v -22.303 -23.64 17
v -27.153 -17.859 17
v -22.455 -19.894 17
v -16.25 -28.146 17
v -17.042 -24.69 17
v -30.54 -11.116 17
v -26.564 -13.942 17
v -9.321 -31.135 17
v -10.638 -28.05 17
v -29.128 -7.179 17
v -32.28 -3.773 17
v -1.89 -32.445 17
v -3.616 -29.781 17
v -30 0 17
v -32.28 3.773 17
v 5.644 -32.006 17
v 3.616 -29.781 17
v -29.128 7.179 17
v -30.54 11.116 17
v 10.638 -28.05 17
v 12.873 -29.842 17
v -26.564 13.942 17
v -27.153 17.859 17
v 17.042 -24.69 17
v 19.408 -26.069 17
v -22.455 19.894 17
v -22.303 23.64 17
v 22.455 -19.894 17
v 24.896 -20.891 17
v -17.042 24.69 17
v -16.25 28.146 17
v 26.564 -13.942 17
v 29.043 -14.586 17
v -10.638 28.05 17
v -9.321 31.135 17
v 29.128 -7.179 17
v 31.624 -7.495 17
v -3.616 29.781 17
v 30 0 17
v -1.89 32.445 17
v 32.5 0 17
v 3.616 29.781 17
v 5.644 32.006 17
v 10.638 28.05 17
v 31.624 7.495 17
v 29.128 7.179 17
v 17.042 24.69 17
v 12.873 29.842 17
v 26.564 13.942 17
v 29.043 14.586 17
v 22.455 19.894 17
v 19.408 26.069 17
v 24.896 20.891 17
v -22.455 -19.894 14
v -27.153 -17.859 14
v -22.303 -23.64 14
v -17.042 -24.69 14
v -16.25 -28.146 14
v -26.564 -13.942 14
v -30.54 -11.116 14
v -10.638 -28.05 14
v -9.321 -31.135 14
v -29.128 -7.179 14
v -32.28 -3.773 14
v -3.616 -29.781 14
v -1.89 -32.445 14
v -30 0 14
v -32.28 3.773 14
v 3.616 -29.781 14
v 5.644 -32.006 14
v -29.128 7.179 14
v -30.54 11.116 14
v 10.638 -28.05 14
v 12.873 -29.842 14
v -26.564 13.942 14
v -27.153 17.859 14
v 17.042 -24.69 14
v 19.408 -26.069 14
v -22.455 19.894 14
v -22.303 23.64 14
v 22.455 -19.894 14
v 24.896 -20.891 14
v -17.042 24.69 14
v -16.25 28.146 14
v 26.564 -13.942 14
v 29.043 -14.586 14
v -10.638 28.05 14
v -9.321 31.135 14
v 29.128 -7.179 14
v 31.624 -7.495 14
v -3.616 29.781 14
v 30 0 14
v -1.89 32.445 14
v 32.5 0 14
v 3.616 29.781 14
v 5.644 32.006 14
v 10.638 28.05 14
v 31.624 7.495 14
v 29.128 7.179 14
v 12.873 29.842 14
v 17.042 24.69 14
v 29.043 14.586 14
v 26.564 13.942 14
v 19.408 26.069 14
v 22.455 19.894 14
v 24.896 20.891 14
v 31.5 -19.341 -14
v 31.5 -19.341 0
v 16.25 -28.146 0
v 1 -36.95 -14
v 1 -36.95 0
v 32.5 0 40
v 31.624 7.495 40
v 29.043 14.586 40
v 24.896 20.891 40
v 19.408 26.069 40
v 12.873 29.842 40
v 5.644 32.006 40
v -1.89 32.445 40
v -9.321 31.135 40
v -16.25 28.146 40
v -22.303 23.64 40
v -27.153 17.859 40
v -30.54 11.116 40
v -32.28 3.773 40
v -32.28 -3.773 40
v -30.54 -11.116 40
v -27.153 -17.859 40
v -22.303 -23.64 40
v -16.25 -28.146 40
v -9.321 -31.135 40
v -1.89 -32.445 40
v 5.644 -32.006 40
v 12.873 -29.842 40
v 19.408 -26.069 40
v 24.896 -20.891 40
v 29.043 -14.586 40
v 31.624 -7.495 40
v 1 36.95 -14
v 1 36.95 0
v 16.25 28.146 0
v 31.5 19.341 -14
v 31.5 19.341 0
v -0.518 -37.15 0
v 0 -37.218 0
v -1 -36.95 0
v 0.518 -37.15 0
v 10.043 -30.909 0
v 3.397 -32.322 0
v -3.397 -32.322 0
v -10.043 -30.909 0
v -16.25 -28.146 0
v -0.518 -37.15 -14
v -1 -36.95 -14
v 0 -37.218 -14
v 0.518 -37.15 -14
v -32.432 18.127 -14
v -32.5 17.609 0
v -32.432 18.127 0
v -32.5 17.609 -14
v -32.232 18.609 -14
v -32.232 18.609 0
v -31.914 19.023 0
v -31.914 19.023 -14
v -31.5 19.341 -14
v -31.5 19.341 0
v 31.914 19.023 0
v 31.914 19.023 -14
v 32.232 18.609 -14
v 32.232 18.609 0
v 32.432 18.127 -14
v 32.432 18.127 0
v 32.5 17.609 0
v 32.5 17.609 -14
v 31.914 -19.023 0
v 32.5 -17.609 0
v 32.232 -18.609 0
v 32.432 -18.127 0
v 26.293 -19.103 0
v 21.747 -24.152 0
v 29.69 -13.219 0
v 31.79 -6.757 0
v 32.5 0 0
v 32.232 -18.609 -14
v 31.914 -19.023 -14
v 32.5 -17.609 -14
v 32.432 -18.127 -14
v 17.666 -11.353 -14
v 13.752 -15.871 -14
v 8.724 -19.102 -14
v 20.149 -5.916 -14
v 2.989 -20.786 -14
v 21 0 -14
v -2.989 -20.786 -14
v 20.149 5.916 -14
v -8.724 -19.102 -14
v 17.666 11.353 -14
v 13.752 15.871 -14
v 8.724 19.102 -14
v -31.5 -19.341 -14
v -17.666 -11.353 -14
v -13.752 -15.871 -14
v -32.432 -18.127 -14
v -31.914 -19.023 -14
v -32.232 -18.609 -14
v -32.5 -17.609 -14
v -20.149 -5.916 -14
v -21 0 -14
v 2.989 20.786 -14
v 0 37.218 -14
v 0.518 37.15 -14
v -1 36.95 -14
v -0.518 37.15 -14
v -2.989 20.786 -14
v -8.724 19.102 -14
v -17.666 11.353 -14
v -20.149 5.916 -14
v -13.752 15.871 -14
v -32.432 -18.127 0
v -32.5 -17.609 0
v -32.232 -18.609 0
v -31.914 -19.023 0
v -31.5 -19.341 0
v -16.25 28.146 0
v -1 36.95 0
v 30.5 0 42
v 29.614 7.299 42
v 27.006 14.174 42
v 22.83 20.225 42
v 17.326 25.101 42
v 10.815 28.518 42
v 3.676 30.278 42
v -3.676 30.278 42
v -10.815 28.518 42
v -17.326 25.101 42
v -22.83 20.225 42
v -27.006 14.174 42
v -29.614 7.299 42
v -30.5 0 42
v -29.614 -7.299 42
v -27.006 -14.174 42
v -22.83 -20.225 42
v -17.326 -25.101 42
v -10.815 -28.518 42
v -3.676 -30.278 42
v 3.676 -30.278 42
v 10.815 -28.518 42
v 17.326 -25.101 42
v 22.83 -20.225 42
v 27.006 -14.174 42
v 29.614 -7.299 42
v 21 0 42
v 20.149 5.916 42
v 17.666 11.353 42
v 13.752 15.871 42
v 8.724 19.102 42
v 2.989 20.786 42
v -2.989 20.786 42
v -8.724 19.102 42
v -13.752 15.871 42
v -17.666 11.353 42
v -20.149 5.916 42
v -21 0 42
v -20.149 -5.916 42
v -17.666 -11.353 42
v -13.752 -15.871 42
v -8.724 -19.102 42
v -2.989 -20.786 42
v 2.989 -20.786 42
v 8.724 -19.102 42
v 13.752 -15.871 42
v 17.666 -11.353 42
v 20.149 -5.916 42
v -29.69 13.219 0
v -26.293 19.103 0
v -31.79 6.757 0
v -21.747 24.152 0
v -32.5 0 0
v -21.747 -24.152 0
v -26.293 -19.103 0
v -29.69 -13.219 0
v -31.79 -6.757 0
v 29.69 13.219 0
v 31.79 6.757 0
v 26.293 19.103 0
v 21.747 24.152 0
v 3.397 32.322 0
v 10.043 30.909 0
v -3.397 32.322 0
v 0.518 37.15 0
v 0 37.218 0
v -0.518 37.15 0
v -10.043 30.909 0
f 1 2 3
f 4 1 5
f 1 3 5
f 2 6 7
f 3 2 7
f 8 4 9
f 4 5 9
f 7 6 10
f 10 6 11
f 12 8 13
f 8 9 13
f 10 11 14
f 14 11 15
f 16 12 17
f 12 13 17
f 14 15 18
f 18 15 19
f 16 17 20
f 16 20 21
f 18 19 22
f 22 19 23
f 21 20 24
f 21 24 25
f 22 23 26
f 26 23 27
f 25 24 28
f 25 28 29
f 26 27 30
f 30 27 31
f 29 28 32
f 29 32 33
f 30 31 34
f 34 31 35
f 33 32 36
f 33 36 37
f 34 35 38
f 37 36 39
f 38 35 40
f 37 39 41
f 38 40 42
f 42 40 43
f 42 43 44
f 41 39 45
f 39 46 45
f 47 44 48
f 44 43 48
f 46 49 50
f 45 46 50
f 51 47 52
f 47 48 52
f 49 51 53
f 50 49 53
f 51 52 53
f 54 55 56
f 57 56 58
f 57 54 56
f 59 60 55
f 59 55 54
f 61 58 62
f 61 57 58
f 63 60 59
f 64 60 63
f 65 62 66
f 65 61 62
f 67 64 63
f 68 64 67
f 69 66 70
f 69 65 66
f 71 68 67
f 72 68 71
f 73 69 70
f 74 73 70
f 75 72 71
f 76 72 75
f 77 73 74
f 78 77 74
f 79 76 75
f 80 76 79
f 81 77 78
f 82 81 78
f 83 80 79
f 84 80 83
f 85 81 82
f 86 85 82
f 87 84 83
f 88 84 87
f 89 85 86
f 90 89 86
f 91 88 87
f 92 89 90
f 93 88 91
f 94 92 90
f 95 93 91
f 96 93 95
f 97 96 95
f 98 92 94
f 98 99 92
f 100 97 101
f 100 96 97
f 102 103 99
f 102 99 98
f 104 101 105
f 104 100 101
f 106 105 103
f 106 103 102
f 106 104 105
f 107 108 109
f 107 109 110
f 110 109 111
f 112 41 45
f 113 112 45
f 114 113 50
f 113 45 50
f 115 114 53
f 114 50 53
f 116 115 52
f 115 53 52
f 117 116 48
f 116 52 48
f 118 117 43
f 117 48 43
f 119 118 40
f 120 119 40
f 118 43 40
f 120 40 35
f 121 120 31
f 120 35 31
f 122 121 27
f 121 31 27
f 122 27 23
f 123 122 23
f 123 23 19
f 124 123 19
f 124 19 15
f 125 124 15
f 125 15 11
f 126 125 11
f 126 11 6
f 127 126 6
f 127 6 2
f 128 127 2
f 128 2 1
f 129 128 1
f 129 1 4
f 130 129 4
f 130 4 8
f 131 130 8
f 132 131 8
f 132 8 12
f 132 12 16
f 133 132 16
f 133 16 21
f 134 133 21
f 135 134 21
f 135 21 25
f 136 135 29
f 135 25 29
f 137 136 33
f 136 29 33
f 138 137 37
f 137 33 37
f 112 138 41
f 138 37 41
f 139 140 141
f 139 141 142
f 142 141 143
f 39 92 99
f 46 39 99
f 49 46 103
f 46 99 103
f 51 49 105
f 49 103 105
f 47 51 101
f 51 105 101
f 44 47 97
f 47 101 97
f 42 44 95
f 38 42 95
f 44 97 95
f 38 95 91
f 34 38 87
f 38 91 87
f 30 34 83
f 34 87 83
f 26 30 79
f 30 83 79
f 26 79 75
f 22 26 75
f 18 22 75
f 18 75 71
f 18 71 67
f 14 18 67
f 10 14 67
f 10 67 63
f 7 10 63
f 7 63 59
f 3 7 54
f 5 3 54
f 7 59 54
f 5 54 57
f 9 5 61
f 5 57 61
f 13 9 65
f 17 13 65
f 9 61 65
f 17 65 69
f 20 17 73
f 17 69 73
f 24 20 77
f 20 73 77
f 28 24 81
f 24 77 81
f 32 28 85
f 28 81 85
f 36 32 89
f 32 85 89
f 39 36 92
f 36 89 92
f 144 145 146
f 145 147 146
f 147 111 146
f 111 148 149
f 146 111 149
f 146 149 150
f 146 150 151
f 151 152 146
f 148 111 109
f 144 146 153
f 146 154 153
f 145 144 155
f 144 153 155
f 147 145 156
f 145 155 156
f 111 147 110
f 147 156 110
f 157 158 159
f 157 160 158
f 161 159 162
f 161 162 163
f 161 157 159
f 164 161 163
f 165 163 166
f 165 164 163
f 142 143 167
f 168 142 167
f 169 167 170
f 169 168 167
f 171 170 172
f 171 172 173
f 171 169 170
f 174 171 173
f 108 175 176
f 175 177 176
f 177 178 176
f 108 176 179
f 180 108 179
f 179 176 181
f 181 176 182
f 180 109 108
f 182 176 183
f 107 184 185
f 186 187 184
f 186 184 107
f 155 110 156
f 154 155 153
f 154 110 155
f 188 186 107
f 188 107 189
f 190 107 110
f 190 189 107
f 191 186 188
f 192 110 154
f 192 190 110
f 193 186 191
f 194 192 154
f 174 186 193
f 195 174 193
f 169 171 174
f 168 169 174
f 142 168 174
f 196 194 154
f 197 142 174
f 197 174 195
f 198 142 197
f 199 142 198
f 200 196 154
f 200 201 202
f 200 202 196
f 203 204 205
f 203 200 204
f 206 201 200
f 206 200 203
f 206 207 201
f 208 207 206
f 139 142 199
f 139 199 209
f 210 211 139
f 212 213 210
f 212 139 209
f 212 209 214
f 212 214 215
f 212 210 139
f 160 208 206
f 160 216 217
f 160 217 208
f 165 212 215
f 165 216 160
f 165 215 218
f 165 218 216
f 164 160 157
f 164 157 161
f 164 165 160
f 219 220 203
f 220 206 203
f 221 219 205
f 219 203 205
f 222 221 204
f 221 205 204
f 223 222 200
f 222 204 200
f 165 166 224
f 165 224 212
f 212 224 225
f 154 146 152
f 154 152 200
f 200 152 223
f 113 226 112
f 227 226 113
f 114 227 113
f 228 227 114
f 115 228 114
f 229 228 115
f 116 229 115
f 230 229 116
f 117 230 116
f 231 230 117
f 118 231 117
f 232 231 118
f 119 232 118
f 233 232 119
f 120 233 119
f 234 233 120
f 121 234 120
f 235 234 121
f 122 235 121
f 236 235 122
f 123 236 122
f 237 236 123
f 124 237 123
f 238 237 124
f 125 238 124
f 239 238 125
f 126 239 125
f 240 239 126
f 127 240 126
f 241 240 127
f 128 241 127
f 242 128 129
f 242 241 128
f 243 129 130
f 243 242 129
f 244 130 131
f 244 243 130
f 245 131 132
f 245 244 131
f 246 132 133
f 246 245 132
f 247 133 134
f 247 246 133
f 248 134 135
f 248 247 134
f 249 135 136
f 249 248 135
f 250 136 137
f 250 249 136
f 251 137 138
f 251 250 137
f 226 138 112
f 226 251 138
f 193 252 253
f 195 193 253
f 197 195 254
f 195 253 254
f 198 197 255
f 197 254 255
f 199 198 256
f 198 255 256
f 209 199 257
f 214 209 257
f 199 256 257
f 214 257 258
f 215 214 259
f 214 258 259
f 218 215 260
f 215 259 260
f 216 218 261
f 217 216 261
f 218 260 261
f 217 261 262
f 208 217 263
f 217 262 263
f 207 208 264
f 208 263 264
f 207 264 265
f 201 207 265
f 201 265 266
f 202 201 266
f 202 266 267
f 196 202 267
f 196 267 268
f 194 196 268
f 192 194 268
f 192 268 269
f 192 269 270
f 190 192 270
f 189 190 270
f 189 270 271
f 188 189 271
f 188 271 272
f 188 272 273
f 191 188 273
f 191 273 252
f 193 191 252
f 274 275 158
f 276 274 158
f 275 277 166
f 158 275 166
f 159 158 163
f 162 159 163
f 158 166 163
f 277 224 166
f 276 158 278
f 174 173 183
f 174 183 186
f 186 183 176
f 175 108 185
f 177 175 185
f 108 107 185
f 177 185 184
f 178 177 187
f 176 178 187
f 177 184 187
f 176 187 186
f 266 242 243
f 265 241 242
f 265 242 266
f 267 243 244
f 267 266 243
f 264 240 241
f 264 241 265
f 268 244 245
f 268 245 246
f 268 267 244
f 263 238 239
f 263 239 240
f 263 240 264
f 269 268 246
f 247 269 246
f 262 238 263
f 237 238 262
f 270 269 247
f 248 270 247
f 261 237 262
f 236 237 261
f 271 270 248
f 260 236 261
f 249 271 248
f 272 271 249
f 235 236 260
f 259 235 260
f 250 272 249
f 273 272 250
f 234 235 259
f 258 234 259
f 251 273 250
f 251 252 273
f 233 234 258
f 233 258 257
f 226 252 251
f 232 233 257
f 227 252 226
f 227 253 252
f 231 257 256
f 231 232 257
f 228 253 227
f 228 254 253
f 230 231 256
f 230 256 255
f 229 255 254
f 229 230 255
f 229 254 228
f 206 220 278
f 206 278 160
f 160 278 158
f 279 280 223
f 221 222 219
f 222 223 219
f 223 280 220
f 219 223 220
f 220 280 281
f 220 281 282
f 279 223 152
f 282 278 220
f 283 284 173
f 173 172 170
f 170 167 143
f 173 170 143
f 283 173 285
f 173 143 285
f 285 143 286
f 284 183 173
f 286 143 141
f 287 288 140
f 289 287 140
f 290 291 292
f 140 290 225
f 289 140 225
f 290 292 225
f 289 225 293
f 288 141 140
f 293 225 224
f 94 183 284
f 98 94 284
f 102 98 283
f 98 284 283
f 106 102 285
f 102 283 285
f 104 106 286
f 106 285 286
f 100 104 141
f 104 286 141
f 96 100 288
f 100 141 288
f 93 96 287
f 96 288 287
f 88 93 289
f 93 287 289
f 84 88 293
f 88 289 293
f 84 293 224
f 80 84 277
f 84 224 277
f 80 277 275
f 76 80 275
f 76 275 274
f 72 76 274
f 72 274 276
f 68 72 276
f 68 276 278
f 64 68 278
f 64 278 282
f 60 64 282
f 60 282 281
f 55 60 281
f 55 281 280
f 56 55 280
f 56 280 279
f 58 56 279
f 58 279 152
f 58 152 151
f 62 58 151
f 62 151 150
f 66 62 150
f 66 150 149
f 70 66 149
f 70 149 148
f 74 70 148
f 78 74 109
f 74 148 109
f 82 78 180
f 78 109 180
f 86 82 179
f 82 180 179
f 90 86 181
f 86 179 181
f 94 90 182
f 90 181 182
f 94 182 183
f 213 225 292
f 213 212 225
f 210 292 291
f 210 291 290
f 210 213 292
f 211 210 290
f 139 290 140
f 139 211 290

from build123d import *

# Parameters (mm, degrees)
SKETCH1_R           = 32.5
BOSS_EXTRUDE1_DEPTH = 42
CUT_EXTRUDE1_START  = -28
SKETCH2_R           = 32.5
SKETCH2_R_2         = 30
CUT_EXTRUDE1_DEPTH  = 3
BOSS_EXTRUDE3_DEPTH = 14
FILLET1_R           = 2
CHAMFER1_SIZE       = 2
SKETCH4_R           = 21
CUT_EXTRUDE4_DEPTH  = 57


with BuildPart() as part:
    # Sketch1 → Boss-Extrude1 (new body)
    with BuildSketch(Plane.XY):
        Circle(SKETCH1_R)
    extrude(amount=BOSS_EXTRUDE1_DEPTH)

    # Sketch2 → Cut-Extrude1 (cut)
    with BuildSketch(Plane.XY.offset(42).offset(CUT_EXTRUDE1_START)):
        Circle(SKETCH2_R)
        Circle(SKETCH2_R_2, mode=Mode.SUBTRACT)
    extrude(amount=CUT_EXTRUDE1_DEPTH, mode=Mode.SUBTRACT)

    # Sketch3 → Boss-Extrude3 (add)
    with BuildSketch(Plane(origin=(0, 0, 0), x_dir=(-1, 0, 0), z_dir=(0, 0, -1))):
        Polygon((32.5, -18.763883749), (32.5, 18.763883749), (0, 37.527767497), (-32.5, 18.763883749), (-32.5, -18.763883749), (0, -37.527767497), align=None)
    extrude(amount=BOSS_EXTRUDE3_DEPTH)

    # Fillet1
    fillet1_edges = [part.edges().sort_by_distance(p)[0] for p in [
        (0, -37.527767497, -7),
        (-32.5, -18.763883749, -7),
        (-32.5, 18.763883749, -7),
        (0, 37.527767497, -7),
        (32.5, 18.763883749, -7),
        (32.5, -18.763883749, -7),
    ]]
    fillet(fillet1_edges, radius=FILLET1_R)

    # Chamfer1
    chamfer1_edges = [part.edges().sort_by_distance(p)[0] for p in [
        (-32.5, 0, 42),
    ]]
    chamfer(chamfer1_edges, length=CHAMFER1_SIZE)

    # Sketch4 → Cut-Extrude4 (cut, through all)
    with BuildSketch(Plane.XY.offset(42)):
        Circle(SKETCH4_R)
    extrude(amount=-CUT_EXTRUDE4_DEPTH, mode=Mode.SUBTRACT)


solid = part.part
